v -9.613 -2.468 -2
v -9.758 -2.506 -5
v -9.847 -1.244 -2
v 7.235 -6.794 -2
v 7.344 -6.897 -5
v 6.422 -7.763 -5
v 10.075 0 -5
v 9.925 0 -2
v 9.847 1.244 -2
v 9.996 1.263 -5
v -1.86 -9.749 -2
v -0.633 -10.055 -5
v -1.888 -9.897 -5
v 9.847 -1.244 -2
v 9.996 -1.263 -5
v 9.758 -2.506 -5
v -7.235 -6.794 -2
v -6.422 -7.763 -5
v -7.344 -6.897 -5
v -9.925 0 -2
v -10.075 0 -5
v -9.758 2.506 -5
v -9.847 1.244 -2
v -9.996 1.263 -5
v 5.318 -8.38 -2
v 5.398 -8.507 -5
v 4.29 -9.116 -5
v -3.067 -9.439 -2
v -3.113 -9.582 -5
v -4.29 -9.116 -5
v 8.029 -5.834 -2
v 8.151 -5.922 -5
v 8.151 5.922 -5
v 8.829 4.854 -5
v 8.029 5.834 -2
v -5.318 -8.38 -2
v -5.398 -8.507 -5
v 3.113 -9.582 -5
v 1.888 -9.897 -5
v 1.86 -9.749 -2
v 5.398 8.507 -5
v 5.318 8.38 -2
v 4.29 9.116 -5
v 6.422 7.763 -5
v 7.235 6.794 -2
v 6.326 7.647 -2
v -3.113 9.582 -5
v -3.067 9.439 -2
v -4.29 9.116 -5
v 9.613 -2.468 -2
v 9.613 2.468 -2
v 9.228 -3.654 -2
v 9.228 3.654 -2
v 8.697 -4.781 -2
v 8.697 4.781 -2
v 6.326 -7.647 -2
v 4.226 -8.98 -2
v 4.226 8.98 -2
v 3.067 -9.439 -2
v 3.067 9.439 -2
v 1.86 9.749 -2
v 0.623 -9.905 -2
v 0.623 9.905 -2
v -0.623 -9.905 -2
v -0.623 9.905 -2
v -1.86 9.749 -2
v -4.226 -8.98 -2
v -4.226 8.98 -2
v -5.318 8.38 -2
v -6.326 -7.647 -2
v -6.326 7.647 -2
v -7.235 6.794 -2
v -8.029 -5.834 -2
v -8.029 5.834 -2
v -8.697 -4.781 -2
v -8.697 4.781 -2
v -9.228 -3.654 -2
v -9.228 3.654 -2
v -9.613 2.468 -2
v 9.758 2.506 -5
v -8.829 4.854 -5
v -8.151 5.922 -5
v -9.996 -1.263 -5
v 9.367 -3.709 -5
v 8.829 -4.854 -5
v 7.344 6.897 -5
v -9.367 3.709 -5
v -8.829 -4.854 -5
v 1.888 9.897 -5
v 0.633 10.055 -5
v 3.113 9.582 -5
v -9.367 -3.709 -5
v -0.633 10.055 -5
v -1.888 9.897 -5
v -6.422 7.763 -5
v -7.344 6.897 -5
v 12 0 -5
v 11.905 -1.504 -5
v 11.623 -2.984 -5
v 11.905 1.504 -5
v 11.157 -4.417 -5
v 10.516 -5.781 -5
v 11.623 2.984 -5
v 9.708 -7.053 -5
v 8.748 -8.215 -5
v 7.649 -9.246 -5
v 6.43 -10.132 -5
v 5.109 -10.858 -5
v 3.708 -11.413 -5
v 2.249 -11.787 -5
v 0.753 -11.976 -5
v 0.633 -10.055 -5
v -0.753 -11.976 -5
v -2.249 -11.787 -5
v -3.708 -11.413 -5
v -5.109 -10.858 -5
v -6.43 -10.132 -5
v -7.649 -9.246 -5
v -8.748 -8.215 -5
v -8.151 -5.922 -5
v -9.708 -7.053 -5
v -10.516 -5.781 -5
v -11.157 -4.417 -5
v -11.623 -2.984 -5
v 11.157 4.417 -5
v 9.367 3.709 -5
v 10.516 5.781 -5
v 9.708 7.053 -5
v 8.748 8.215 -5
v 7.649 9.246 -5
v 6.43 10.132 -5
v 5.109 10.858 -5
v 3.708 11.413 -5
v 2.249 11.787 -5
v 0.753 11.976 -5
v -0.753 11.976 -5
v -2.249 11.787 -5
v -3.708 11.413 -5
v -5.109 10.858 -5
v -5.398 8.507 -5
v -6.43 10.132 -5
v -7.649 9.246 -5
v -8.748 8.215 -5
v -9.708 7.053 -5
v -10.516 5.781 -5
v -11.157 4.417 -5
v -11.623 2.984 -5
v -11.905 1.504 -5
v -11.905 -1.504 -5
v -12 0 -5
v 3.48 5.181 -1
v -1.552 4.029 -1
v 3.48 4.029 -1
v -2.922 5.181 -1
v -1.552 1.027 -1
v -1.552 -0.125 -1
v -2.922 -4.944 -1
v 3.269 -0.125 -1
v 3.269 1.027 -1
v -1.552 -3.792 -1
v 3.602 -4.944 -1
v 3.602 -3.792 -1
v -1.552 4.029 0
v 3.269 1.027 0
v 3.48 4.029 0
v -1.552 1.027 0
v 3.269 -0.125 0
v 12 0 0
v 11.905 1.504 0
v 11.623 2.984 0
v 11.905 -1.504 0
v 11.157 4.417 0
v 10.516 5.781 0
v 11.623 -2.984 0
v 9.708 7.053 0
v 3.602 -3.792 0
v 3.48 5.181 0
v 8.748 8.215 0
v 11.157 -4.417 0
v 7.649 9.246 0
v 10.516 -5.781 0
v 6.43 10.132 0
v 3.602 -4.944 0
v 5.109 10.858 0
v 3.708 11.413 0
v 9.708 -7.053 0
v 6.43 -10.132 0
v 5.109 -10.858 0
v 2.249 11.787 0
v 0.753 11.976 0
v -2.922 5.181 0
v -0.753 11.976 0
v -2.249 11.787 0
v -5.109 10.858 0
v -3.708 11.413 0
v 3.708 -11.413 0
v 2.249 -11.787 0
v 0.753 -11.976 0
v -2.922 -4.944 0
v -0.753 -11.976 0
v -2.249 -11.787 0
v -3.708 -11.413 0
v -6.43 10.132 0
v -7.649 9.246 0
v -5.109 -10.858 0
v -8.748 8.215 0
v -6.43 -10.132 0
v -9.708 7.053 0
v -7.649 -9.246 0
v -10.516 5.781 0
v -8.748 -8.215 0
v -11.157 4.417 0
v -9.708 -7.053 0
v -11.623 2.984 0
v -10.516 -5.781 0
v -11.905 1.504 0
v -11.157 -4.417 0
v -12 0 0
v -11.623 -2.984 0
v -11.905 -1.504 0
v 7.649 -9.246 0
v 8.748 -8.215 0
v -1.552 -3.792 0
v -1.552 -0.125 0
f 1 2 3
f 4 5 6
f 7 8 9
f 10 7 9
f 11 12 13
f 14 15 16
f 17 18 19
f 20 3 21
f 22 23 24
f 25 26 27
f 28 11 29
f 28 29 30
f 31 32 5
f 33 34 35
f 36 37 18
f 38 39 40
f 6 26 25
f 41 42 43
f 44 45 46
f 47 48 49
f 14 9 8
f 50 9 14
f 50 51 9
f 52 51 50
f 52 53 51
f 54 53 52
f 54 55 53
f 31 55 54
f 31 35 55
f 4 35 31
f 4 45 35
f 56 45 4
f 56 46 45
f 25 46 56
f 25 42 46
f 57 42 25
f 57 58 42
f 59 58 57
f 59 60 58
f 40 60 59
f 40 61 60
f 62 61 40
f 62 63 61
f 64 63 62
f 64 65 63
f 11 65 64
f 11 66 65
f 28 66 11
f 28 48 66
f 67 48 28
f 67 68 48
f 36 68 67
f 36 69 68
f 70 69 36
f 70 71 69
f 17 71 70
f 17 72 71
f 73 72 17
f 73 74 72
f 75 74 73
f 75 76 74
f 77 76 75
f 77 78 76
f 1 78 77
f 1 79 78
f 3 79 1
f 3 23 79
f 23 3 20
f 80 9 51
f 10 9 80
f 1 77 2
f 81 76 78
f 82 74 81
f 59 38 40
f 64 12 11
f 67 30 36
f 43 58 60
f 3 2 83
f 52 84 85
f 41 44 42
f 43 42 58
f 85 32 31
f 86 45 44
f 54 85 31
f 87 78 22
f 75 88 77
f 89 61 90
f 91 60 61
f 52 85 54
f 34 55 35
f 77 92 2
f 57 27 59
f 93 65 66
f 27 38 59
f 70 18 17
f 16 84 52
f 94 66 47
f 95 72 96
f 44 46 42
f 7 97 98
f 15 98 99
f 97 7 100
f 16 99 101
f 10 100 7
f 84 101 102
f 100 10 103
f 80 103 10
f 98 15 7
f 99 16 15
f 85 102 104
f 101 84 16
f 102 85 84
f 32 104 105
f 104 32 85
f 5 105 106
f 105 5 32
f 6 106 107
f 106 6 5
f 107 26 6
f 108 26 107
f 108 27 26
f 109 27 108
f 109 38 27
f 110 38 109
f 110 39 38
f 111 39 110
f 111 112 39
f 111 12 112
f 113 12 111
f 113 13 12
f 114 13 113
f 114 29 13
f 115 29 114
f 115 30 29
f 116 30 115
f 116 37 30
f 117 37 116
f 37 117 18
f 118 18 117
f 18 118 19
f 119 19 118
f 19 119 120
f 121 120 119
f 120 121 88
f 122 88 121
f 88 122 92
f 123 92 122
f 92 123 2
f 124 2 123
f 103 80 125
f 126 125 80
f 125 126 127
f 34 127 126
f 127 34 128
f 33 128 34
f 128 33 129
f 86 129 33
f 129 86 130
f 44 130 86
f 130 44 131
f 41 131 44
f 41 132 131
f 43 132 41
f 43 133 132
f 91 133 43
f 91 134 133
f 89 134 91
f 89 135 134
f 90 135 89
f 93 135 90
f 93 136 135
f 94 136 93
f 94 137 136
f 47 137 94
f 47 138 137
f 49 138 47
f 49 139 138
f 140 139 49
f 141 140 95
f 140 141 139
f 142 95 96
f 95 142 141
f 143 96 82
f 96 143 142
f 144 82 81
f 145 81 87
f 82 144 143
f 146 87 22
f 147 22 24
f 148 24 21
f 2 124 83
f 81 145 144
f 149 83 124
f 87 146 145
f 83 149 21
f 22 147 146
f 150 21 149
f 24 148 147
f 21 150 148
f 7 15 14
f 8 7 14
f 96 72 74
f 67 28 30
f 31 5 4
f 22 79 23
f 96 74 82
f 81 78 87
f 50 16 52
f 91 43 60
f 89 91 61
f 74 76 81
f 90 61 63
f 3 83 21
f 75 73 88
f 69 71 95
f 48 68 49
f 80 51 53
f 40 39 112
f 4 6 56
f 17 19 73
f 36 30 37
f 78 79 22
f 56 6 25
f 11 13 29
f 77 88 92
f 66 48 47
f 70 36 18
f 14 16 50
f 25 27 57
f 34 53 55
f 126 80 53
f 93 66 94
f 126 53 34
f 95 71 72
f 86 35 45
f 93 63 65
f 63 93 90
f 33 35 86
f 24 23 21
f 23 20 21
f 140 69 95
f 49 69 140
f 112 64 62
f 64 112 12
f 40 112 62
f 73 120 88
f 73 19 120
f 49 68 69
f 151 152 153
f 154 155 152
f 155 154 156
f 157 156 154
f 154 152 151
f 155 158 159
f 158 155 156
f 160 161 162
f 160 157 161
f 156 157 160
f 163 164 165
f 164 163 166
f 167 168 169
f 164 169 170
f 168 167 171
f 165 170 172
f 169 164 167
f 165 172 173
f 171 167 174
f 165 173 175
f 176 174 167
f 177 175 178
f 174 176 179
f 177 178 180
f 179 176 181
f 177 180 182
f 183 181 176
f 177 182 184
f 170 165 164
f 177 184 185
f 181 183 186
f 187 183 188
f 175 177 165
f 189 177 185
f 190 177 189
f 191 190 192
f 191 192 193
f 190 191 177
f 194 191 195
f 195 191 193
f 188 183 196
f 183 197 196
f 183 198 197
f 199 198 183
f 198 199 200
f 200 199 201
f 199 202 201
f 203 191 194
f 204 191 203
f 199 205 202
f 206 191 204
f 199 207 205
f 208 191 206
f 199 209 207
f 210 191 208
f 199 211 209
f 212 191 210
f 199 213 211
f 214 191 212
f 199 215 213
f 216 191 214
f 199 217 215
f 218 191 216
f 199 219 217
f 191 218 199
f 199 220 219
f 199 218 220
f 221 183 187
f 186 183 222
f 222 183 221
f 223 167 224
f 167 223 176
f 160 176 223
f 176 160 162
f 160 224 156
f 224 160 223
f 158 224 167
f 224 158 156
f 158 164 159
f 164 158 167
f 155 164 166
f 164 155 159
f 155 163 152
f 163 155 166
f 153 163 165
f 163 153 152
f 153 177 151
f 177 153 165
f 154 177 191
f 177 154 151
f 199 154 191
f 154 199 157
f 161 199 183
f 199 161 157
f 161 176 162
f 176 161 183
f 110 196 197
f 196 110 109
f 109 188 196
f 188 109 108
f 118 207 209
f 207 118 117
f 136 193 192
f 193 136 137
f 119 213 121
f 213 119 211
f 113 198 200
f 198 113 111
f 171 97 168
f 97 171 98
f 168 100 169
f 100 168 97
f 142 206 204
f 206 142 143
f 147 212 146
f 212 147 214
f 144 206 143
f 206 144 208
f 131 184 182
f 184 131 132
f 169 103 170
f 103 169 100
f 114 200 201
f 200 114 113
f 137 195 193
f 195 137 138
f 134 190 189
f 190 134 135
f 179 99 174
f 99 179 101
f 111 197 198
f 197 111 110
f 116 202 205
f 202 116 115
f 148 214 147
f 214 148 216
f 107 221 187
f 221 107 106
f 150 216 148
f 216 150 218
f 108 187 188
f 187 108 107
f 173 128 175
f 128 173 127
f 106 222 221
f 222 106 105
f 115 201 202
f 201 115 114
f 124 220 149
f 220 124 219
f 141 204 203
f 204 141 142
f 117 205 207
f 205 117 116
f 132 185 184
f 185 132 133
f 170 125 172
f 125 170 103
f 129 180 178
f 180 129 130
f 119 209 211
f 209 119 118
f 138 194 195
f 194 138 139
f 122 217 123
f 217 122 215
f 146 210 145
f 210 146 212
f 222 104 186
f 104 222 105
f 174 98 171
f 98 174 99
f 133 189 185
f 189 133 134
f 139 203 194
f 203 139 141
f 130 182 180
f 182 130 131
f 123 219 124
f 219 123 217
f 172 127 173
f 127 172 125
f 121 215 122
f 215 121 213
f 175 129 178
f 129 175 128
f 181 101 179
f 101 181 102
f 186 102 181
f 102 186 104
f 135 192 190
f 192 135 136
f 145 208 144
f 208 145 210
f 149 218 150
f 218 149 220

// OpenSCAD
$fn = 50;

difference() {
	union() {
		translate(v = [0, 0, -5.0]) {
			cylinder(h = 5, r = 12.0);
		}
	}
	union() {
		#translate(v = [0, 0, -5.0]) {
			cylinder(h = 3, r1 = 10.075, r2 = 9.925);
		}
		translate(v = [0, 0, -1]) {
			linear_extrude(height = 1) {
				text(font = "Impact", halign = "center", size = 10, text = "E", valign = "center");
			}
		}
	}
}
